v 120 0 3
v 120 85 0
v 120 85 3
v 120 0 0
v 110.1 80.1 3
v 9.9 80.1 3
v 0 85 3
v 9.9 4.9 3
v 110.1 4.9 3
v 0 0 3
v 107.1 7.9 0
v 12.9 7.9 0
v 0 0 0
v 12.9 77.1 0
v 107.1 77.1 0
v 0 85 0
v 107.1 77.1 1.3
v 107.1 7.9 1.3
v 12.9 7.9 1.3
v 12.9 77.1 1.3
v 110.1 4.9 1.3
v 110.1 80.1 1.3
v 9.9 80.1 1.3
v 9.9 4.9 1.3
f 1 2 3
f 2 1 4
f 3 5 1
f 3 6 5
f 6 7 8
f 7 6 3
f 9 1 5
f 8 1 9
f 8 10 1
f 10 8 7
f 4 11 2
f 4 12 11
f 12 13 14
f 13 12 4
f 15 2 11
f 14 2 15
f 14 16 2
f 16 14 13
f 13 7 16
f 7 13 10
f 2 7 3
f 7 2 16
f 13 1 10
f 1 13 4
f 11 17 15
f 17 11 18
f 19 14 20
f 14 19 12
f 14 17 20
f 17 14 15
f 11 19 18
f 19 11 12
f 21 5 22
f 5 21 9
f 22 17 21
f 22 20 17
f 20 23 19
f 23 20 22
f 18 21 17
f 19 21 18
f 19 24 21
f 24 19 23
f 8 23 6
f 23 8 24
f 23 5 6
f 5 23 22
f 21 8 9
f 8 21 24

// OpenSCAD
/*
	circuit board holder

	2015 by ChrisMicro

*/

frameLength = 120;
frameWidth  = 85;
frameHeight = 3;

boardAuflageBreite = 3;

manuFactoringOffset = 0.2;

boardLength = 100 + manuFactoringOffset;
boardWidth  = 75  + manuFactoringOffset;
boardHeight = 1.5 + manuFactoringOffset;

//translate([frameLength/2-5,0,frameHeight])
	//cube([10,(frameWidth-boardWidth)/2+boardAuflageBreite,frameHeight]);

difference()
{
	// frane
	cube([frameLength,frameWidth,frameHeight]);
	
	// loch 
	translate([(frameLength-boardLength)/2+boardAuflageBreite,(frameWidth-boardWidth)/2+boardAuflageBreite,0])
		cube([boardLength-boardAuflageBreite*2,boardWidth-boardAuflageBreite*2,frameHeight]);

	// board
	translate([(frameLength-boardLength)/2,(frameWidth-boardWidth)/2,frameHeight-boardHeight])
		cube([boardLength,boardWidth,boardHeight]);

}
